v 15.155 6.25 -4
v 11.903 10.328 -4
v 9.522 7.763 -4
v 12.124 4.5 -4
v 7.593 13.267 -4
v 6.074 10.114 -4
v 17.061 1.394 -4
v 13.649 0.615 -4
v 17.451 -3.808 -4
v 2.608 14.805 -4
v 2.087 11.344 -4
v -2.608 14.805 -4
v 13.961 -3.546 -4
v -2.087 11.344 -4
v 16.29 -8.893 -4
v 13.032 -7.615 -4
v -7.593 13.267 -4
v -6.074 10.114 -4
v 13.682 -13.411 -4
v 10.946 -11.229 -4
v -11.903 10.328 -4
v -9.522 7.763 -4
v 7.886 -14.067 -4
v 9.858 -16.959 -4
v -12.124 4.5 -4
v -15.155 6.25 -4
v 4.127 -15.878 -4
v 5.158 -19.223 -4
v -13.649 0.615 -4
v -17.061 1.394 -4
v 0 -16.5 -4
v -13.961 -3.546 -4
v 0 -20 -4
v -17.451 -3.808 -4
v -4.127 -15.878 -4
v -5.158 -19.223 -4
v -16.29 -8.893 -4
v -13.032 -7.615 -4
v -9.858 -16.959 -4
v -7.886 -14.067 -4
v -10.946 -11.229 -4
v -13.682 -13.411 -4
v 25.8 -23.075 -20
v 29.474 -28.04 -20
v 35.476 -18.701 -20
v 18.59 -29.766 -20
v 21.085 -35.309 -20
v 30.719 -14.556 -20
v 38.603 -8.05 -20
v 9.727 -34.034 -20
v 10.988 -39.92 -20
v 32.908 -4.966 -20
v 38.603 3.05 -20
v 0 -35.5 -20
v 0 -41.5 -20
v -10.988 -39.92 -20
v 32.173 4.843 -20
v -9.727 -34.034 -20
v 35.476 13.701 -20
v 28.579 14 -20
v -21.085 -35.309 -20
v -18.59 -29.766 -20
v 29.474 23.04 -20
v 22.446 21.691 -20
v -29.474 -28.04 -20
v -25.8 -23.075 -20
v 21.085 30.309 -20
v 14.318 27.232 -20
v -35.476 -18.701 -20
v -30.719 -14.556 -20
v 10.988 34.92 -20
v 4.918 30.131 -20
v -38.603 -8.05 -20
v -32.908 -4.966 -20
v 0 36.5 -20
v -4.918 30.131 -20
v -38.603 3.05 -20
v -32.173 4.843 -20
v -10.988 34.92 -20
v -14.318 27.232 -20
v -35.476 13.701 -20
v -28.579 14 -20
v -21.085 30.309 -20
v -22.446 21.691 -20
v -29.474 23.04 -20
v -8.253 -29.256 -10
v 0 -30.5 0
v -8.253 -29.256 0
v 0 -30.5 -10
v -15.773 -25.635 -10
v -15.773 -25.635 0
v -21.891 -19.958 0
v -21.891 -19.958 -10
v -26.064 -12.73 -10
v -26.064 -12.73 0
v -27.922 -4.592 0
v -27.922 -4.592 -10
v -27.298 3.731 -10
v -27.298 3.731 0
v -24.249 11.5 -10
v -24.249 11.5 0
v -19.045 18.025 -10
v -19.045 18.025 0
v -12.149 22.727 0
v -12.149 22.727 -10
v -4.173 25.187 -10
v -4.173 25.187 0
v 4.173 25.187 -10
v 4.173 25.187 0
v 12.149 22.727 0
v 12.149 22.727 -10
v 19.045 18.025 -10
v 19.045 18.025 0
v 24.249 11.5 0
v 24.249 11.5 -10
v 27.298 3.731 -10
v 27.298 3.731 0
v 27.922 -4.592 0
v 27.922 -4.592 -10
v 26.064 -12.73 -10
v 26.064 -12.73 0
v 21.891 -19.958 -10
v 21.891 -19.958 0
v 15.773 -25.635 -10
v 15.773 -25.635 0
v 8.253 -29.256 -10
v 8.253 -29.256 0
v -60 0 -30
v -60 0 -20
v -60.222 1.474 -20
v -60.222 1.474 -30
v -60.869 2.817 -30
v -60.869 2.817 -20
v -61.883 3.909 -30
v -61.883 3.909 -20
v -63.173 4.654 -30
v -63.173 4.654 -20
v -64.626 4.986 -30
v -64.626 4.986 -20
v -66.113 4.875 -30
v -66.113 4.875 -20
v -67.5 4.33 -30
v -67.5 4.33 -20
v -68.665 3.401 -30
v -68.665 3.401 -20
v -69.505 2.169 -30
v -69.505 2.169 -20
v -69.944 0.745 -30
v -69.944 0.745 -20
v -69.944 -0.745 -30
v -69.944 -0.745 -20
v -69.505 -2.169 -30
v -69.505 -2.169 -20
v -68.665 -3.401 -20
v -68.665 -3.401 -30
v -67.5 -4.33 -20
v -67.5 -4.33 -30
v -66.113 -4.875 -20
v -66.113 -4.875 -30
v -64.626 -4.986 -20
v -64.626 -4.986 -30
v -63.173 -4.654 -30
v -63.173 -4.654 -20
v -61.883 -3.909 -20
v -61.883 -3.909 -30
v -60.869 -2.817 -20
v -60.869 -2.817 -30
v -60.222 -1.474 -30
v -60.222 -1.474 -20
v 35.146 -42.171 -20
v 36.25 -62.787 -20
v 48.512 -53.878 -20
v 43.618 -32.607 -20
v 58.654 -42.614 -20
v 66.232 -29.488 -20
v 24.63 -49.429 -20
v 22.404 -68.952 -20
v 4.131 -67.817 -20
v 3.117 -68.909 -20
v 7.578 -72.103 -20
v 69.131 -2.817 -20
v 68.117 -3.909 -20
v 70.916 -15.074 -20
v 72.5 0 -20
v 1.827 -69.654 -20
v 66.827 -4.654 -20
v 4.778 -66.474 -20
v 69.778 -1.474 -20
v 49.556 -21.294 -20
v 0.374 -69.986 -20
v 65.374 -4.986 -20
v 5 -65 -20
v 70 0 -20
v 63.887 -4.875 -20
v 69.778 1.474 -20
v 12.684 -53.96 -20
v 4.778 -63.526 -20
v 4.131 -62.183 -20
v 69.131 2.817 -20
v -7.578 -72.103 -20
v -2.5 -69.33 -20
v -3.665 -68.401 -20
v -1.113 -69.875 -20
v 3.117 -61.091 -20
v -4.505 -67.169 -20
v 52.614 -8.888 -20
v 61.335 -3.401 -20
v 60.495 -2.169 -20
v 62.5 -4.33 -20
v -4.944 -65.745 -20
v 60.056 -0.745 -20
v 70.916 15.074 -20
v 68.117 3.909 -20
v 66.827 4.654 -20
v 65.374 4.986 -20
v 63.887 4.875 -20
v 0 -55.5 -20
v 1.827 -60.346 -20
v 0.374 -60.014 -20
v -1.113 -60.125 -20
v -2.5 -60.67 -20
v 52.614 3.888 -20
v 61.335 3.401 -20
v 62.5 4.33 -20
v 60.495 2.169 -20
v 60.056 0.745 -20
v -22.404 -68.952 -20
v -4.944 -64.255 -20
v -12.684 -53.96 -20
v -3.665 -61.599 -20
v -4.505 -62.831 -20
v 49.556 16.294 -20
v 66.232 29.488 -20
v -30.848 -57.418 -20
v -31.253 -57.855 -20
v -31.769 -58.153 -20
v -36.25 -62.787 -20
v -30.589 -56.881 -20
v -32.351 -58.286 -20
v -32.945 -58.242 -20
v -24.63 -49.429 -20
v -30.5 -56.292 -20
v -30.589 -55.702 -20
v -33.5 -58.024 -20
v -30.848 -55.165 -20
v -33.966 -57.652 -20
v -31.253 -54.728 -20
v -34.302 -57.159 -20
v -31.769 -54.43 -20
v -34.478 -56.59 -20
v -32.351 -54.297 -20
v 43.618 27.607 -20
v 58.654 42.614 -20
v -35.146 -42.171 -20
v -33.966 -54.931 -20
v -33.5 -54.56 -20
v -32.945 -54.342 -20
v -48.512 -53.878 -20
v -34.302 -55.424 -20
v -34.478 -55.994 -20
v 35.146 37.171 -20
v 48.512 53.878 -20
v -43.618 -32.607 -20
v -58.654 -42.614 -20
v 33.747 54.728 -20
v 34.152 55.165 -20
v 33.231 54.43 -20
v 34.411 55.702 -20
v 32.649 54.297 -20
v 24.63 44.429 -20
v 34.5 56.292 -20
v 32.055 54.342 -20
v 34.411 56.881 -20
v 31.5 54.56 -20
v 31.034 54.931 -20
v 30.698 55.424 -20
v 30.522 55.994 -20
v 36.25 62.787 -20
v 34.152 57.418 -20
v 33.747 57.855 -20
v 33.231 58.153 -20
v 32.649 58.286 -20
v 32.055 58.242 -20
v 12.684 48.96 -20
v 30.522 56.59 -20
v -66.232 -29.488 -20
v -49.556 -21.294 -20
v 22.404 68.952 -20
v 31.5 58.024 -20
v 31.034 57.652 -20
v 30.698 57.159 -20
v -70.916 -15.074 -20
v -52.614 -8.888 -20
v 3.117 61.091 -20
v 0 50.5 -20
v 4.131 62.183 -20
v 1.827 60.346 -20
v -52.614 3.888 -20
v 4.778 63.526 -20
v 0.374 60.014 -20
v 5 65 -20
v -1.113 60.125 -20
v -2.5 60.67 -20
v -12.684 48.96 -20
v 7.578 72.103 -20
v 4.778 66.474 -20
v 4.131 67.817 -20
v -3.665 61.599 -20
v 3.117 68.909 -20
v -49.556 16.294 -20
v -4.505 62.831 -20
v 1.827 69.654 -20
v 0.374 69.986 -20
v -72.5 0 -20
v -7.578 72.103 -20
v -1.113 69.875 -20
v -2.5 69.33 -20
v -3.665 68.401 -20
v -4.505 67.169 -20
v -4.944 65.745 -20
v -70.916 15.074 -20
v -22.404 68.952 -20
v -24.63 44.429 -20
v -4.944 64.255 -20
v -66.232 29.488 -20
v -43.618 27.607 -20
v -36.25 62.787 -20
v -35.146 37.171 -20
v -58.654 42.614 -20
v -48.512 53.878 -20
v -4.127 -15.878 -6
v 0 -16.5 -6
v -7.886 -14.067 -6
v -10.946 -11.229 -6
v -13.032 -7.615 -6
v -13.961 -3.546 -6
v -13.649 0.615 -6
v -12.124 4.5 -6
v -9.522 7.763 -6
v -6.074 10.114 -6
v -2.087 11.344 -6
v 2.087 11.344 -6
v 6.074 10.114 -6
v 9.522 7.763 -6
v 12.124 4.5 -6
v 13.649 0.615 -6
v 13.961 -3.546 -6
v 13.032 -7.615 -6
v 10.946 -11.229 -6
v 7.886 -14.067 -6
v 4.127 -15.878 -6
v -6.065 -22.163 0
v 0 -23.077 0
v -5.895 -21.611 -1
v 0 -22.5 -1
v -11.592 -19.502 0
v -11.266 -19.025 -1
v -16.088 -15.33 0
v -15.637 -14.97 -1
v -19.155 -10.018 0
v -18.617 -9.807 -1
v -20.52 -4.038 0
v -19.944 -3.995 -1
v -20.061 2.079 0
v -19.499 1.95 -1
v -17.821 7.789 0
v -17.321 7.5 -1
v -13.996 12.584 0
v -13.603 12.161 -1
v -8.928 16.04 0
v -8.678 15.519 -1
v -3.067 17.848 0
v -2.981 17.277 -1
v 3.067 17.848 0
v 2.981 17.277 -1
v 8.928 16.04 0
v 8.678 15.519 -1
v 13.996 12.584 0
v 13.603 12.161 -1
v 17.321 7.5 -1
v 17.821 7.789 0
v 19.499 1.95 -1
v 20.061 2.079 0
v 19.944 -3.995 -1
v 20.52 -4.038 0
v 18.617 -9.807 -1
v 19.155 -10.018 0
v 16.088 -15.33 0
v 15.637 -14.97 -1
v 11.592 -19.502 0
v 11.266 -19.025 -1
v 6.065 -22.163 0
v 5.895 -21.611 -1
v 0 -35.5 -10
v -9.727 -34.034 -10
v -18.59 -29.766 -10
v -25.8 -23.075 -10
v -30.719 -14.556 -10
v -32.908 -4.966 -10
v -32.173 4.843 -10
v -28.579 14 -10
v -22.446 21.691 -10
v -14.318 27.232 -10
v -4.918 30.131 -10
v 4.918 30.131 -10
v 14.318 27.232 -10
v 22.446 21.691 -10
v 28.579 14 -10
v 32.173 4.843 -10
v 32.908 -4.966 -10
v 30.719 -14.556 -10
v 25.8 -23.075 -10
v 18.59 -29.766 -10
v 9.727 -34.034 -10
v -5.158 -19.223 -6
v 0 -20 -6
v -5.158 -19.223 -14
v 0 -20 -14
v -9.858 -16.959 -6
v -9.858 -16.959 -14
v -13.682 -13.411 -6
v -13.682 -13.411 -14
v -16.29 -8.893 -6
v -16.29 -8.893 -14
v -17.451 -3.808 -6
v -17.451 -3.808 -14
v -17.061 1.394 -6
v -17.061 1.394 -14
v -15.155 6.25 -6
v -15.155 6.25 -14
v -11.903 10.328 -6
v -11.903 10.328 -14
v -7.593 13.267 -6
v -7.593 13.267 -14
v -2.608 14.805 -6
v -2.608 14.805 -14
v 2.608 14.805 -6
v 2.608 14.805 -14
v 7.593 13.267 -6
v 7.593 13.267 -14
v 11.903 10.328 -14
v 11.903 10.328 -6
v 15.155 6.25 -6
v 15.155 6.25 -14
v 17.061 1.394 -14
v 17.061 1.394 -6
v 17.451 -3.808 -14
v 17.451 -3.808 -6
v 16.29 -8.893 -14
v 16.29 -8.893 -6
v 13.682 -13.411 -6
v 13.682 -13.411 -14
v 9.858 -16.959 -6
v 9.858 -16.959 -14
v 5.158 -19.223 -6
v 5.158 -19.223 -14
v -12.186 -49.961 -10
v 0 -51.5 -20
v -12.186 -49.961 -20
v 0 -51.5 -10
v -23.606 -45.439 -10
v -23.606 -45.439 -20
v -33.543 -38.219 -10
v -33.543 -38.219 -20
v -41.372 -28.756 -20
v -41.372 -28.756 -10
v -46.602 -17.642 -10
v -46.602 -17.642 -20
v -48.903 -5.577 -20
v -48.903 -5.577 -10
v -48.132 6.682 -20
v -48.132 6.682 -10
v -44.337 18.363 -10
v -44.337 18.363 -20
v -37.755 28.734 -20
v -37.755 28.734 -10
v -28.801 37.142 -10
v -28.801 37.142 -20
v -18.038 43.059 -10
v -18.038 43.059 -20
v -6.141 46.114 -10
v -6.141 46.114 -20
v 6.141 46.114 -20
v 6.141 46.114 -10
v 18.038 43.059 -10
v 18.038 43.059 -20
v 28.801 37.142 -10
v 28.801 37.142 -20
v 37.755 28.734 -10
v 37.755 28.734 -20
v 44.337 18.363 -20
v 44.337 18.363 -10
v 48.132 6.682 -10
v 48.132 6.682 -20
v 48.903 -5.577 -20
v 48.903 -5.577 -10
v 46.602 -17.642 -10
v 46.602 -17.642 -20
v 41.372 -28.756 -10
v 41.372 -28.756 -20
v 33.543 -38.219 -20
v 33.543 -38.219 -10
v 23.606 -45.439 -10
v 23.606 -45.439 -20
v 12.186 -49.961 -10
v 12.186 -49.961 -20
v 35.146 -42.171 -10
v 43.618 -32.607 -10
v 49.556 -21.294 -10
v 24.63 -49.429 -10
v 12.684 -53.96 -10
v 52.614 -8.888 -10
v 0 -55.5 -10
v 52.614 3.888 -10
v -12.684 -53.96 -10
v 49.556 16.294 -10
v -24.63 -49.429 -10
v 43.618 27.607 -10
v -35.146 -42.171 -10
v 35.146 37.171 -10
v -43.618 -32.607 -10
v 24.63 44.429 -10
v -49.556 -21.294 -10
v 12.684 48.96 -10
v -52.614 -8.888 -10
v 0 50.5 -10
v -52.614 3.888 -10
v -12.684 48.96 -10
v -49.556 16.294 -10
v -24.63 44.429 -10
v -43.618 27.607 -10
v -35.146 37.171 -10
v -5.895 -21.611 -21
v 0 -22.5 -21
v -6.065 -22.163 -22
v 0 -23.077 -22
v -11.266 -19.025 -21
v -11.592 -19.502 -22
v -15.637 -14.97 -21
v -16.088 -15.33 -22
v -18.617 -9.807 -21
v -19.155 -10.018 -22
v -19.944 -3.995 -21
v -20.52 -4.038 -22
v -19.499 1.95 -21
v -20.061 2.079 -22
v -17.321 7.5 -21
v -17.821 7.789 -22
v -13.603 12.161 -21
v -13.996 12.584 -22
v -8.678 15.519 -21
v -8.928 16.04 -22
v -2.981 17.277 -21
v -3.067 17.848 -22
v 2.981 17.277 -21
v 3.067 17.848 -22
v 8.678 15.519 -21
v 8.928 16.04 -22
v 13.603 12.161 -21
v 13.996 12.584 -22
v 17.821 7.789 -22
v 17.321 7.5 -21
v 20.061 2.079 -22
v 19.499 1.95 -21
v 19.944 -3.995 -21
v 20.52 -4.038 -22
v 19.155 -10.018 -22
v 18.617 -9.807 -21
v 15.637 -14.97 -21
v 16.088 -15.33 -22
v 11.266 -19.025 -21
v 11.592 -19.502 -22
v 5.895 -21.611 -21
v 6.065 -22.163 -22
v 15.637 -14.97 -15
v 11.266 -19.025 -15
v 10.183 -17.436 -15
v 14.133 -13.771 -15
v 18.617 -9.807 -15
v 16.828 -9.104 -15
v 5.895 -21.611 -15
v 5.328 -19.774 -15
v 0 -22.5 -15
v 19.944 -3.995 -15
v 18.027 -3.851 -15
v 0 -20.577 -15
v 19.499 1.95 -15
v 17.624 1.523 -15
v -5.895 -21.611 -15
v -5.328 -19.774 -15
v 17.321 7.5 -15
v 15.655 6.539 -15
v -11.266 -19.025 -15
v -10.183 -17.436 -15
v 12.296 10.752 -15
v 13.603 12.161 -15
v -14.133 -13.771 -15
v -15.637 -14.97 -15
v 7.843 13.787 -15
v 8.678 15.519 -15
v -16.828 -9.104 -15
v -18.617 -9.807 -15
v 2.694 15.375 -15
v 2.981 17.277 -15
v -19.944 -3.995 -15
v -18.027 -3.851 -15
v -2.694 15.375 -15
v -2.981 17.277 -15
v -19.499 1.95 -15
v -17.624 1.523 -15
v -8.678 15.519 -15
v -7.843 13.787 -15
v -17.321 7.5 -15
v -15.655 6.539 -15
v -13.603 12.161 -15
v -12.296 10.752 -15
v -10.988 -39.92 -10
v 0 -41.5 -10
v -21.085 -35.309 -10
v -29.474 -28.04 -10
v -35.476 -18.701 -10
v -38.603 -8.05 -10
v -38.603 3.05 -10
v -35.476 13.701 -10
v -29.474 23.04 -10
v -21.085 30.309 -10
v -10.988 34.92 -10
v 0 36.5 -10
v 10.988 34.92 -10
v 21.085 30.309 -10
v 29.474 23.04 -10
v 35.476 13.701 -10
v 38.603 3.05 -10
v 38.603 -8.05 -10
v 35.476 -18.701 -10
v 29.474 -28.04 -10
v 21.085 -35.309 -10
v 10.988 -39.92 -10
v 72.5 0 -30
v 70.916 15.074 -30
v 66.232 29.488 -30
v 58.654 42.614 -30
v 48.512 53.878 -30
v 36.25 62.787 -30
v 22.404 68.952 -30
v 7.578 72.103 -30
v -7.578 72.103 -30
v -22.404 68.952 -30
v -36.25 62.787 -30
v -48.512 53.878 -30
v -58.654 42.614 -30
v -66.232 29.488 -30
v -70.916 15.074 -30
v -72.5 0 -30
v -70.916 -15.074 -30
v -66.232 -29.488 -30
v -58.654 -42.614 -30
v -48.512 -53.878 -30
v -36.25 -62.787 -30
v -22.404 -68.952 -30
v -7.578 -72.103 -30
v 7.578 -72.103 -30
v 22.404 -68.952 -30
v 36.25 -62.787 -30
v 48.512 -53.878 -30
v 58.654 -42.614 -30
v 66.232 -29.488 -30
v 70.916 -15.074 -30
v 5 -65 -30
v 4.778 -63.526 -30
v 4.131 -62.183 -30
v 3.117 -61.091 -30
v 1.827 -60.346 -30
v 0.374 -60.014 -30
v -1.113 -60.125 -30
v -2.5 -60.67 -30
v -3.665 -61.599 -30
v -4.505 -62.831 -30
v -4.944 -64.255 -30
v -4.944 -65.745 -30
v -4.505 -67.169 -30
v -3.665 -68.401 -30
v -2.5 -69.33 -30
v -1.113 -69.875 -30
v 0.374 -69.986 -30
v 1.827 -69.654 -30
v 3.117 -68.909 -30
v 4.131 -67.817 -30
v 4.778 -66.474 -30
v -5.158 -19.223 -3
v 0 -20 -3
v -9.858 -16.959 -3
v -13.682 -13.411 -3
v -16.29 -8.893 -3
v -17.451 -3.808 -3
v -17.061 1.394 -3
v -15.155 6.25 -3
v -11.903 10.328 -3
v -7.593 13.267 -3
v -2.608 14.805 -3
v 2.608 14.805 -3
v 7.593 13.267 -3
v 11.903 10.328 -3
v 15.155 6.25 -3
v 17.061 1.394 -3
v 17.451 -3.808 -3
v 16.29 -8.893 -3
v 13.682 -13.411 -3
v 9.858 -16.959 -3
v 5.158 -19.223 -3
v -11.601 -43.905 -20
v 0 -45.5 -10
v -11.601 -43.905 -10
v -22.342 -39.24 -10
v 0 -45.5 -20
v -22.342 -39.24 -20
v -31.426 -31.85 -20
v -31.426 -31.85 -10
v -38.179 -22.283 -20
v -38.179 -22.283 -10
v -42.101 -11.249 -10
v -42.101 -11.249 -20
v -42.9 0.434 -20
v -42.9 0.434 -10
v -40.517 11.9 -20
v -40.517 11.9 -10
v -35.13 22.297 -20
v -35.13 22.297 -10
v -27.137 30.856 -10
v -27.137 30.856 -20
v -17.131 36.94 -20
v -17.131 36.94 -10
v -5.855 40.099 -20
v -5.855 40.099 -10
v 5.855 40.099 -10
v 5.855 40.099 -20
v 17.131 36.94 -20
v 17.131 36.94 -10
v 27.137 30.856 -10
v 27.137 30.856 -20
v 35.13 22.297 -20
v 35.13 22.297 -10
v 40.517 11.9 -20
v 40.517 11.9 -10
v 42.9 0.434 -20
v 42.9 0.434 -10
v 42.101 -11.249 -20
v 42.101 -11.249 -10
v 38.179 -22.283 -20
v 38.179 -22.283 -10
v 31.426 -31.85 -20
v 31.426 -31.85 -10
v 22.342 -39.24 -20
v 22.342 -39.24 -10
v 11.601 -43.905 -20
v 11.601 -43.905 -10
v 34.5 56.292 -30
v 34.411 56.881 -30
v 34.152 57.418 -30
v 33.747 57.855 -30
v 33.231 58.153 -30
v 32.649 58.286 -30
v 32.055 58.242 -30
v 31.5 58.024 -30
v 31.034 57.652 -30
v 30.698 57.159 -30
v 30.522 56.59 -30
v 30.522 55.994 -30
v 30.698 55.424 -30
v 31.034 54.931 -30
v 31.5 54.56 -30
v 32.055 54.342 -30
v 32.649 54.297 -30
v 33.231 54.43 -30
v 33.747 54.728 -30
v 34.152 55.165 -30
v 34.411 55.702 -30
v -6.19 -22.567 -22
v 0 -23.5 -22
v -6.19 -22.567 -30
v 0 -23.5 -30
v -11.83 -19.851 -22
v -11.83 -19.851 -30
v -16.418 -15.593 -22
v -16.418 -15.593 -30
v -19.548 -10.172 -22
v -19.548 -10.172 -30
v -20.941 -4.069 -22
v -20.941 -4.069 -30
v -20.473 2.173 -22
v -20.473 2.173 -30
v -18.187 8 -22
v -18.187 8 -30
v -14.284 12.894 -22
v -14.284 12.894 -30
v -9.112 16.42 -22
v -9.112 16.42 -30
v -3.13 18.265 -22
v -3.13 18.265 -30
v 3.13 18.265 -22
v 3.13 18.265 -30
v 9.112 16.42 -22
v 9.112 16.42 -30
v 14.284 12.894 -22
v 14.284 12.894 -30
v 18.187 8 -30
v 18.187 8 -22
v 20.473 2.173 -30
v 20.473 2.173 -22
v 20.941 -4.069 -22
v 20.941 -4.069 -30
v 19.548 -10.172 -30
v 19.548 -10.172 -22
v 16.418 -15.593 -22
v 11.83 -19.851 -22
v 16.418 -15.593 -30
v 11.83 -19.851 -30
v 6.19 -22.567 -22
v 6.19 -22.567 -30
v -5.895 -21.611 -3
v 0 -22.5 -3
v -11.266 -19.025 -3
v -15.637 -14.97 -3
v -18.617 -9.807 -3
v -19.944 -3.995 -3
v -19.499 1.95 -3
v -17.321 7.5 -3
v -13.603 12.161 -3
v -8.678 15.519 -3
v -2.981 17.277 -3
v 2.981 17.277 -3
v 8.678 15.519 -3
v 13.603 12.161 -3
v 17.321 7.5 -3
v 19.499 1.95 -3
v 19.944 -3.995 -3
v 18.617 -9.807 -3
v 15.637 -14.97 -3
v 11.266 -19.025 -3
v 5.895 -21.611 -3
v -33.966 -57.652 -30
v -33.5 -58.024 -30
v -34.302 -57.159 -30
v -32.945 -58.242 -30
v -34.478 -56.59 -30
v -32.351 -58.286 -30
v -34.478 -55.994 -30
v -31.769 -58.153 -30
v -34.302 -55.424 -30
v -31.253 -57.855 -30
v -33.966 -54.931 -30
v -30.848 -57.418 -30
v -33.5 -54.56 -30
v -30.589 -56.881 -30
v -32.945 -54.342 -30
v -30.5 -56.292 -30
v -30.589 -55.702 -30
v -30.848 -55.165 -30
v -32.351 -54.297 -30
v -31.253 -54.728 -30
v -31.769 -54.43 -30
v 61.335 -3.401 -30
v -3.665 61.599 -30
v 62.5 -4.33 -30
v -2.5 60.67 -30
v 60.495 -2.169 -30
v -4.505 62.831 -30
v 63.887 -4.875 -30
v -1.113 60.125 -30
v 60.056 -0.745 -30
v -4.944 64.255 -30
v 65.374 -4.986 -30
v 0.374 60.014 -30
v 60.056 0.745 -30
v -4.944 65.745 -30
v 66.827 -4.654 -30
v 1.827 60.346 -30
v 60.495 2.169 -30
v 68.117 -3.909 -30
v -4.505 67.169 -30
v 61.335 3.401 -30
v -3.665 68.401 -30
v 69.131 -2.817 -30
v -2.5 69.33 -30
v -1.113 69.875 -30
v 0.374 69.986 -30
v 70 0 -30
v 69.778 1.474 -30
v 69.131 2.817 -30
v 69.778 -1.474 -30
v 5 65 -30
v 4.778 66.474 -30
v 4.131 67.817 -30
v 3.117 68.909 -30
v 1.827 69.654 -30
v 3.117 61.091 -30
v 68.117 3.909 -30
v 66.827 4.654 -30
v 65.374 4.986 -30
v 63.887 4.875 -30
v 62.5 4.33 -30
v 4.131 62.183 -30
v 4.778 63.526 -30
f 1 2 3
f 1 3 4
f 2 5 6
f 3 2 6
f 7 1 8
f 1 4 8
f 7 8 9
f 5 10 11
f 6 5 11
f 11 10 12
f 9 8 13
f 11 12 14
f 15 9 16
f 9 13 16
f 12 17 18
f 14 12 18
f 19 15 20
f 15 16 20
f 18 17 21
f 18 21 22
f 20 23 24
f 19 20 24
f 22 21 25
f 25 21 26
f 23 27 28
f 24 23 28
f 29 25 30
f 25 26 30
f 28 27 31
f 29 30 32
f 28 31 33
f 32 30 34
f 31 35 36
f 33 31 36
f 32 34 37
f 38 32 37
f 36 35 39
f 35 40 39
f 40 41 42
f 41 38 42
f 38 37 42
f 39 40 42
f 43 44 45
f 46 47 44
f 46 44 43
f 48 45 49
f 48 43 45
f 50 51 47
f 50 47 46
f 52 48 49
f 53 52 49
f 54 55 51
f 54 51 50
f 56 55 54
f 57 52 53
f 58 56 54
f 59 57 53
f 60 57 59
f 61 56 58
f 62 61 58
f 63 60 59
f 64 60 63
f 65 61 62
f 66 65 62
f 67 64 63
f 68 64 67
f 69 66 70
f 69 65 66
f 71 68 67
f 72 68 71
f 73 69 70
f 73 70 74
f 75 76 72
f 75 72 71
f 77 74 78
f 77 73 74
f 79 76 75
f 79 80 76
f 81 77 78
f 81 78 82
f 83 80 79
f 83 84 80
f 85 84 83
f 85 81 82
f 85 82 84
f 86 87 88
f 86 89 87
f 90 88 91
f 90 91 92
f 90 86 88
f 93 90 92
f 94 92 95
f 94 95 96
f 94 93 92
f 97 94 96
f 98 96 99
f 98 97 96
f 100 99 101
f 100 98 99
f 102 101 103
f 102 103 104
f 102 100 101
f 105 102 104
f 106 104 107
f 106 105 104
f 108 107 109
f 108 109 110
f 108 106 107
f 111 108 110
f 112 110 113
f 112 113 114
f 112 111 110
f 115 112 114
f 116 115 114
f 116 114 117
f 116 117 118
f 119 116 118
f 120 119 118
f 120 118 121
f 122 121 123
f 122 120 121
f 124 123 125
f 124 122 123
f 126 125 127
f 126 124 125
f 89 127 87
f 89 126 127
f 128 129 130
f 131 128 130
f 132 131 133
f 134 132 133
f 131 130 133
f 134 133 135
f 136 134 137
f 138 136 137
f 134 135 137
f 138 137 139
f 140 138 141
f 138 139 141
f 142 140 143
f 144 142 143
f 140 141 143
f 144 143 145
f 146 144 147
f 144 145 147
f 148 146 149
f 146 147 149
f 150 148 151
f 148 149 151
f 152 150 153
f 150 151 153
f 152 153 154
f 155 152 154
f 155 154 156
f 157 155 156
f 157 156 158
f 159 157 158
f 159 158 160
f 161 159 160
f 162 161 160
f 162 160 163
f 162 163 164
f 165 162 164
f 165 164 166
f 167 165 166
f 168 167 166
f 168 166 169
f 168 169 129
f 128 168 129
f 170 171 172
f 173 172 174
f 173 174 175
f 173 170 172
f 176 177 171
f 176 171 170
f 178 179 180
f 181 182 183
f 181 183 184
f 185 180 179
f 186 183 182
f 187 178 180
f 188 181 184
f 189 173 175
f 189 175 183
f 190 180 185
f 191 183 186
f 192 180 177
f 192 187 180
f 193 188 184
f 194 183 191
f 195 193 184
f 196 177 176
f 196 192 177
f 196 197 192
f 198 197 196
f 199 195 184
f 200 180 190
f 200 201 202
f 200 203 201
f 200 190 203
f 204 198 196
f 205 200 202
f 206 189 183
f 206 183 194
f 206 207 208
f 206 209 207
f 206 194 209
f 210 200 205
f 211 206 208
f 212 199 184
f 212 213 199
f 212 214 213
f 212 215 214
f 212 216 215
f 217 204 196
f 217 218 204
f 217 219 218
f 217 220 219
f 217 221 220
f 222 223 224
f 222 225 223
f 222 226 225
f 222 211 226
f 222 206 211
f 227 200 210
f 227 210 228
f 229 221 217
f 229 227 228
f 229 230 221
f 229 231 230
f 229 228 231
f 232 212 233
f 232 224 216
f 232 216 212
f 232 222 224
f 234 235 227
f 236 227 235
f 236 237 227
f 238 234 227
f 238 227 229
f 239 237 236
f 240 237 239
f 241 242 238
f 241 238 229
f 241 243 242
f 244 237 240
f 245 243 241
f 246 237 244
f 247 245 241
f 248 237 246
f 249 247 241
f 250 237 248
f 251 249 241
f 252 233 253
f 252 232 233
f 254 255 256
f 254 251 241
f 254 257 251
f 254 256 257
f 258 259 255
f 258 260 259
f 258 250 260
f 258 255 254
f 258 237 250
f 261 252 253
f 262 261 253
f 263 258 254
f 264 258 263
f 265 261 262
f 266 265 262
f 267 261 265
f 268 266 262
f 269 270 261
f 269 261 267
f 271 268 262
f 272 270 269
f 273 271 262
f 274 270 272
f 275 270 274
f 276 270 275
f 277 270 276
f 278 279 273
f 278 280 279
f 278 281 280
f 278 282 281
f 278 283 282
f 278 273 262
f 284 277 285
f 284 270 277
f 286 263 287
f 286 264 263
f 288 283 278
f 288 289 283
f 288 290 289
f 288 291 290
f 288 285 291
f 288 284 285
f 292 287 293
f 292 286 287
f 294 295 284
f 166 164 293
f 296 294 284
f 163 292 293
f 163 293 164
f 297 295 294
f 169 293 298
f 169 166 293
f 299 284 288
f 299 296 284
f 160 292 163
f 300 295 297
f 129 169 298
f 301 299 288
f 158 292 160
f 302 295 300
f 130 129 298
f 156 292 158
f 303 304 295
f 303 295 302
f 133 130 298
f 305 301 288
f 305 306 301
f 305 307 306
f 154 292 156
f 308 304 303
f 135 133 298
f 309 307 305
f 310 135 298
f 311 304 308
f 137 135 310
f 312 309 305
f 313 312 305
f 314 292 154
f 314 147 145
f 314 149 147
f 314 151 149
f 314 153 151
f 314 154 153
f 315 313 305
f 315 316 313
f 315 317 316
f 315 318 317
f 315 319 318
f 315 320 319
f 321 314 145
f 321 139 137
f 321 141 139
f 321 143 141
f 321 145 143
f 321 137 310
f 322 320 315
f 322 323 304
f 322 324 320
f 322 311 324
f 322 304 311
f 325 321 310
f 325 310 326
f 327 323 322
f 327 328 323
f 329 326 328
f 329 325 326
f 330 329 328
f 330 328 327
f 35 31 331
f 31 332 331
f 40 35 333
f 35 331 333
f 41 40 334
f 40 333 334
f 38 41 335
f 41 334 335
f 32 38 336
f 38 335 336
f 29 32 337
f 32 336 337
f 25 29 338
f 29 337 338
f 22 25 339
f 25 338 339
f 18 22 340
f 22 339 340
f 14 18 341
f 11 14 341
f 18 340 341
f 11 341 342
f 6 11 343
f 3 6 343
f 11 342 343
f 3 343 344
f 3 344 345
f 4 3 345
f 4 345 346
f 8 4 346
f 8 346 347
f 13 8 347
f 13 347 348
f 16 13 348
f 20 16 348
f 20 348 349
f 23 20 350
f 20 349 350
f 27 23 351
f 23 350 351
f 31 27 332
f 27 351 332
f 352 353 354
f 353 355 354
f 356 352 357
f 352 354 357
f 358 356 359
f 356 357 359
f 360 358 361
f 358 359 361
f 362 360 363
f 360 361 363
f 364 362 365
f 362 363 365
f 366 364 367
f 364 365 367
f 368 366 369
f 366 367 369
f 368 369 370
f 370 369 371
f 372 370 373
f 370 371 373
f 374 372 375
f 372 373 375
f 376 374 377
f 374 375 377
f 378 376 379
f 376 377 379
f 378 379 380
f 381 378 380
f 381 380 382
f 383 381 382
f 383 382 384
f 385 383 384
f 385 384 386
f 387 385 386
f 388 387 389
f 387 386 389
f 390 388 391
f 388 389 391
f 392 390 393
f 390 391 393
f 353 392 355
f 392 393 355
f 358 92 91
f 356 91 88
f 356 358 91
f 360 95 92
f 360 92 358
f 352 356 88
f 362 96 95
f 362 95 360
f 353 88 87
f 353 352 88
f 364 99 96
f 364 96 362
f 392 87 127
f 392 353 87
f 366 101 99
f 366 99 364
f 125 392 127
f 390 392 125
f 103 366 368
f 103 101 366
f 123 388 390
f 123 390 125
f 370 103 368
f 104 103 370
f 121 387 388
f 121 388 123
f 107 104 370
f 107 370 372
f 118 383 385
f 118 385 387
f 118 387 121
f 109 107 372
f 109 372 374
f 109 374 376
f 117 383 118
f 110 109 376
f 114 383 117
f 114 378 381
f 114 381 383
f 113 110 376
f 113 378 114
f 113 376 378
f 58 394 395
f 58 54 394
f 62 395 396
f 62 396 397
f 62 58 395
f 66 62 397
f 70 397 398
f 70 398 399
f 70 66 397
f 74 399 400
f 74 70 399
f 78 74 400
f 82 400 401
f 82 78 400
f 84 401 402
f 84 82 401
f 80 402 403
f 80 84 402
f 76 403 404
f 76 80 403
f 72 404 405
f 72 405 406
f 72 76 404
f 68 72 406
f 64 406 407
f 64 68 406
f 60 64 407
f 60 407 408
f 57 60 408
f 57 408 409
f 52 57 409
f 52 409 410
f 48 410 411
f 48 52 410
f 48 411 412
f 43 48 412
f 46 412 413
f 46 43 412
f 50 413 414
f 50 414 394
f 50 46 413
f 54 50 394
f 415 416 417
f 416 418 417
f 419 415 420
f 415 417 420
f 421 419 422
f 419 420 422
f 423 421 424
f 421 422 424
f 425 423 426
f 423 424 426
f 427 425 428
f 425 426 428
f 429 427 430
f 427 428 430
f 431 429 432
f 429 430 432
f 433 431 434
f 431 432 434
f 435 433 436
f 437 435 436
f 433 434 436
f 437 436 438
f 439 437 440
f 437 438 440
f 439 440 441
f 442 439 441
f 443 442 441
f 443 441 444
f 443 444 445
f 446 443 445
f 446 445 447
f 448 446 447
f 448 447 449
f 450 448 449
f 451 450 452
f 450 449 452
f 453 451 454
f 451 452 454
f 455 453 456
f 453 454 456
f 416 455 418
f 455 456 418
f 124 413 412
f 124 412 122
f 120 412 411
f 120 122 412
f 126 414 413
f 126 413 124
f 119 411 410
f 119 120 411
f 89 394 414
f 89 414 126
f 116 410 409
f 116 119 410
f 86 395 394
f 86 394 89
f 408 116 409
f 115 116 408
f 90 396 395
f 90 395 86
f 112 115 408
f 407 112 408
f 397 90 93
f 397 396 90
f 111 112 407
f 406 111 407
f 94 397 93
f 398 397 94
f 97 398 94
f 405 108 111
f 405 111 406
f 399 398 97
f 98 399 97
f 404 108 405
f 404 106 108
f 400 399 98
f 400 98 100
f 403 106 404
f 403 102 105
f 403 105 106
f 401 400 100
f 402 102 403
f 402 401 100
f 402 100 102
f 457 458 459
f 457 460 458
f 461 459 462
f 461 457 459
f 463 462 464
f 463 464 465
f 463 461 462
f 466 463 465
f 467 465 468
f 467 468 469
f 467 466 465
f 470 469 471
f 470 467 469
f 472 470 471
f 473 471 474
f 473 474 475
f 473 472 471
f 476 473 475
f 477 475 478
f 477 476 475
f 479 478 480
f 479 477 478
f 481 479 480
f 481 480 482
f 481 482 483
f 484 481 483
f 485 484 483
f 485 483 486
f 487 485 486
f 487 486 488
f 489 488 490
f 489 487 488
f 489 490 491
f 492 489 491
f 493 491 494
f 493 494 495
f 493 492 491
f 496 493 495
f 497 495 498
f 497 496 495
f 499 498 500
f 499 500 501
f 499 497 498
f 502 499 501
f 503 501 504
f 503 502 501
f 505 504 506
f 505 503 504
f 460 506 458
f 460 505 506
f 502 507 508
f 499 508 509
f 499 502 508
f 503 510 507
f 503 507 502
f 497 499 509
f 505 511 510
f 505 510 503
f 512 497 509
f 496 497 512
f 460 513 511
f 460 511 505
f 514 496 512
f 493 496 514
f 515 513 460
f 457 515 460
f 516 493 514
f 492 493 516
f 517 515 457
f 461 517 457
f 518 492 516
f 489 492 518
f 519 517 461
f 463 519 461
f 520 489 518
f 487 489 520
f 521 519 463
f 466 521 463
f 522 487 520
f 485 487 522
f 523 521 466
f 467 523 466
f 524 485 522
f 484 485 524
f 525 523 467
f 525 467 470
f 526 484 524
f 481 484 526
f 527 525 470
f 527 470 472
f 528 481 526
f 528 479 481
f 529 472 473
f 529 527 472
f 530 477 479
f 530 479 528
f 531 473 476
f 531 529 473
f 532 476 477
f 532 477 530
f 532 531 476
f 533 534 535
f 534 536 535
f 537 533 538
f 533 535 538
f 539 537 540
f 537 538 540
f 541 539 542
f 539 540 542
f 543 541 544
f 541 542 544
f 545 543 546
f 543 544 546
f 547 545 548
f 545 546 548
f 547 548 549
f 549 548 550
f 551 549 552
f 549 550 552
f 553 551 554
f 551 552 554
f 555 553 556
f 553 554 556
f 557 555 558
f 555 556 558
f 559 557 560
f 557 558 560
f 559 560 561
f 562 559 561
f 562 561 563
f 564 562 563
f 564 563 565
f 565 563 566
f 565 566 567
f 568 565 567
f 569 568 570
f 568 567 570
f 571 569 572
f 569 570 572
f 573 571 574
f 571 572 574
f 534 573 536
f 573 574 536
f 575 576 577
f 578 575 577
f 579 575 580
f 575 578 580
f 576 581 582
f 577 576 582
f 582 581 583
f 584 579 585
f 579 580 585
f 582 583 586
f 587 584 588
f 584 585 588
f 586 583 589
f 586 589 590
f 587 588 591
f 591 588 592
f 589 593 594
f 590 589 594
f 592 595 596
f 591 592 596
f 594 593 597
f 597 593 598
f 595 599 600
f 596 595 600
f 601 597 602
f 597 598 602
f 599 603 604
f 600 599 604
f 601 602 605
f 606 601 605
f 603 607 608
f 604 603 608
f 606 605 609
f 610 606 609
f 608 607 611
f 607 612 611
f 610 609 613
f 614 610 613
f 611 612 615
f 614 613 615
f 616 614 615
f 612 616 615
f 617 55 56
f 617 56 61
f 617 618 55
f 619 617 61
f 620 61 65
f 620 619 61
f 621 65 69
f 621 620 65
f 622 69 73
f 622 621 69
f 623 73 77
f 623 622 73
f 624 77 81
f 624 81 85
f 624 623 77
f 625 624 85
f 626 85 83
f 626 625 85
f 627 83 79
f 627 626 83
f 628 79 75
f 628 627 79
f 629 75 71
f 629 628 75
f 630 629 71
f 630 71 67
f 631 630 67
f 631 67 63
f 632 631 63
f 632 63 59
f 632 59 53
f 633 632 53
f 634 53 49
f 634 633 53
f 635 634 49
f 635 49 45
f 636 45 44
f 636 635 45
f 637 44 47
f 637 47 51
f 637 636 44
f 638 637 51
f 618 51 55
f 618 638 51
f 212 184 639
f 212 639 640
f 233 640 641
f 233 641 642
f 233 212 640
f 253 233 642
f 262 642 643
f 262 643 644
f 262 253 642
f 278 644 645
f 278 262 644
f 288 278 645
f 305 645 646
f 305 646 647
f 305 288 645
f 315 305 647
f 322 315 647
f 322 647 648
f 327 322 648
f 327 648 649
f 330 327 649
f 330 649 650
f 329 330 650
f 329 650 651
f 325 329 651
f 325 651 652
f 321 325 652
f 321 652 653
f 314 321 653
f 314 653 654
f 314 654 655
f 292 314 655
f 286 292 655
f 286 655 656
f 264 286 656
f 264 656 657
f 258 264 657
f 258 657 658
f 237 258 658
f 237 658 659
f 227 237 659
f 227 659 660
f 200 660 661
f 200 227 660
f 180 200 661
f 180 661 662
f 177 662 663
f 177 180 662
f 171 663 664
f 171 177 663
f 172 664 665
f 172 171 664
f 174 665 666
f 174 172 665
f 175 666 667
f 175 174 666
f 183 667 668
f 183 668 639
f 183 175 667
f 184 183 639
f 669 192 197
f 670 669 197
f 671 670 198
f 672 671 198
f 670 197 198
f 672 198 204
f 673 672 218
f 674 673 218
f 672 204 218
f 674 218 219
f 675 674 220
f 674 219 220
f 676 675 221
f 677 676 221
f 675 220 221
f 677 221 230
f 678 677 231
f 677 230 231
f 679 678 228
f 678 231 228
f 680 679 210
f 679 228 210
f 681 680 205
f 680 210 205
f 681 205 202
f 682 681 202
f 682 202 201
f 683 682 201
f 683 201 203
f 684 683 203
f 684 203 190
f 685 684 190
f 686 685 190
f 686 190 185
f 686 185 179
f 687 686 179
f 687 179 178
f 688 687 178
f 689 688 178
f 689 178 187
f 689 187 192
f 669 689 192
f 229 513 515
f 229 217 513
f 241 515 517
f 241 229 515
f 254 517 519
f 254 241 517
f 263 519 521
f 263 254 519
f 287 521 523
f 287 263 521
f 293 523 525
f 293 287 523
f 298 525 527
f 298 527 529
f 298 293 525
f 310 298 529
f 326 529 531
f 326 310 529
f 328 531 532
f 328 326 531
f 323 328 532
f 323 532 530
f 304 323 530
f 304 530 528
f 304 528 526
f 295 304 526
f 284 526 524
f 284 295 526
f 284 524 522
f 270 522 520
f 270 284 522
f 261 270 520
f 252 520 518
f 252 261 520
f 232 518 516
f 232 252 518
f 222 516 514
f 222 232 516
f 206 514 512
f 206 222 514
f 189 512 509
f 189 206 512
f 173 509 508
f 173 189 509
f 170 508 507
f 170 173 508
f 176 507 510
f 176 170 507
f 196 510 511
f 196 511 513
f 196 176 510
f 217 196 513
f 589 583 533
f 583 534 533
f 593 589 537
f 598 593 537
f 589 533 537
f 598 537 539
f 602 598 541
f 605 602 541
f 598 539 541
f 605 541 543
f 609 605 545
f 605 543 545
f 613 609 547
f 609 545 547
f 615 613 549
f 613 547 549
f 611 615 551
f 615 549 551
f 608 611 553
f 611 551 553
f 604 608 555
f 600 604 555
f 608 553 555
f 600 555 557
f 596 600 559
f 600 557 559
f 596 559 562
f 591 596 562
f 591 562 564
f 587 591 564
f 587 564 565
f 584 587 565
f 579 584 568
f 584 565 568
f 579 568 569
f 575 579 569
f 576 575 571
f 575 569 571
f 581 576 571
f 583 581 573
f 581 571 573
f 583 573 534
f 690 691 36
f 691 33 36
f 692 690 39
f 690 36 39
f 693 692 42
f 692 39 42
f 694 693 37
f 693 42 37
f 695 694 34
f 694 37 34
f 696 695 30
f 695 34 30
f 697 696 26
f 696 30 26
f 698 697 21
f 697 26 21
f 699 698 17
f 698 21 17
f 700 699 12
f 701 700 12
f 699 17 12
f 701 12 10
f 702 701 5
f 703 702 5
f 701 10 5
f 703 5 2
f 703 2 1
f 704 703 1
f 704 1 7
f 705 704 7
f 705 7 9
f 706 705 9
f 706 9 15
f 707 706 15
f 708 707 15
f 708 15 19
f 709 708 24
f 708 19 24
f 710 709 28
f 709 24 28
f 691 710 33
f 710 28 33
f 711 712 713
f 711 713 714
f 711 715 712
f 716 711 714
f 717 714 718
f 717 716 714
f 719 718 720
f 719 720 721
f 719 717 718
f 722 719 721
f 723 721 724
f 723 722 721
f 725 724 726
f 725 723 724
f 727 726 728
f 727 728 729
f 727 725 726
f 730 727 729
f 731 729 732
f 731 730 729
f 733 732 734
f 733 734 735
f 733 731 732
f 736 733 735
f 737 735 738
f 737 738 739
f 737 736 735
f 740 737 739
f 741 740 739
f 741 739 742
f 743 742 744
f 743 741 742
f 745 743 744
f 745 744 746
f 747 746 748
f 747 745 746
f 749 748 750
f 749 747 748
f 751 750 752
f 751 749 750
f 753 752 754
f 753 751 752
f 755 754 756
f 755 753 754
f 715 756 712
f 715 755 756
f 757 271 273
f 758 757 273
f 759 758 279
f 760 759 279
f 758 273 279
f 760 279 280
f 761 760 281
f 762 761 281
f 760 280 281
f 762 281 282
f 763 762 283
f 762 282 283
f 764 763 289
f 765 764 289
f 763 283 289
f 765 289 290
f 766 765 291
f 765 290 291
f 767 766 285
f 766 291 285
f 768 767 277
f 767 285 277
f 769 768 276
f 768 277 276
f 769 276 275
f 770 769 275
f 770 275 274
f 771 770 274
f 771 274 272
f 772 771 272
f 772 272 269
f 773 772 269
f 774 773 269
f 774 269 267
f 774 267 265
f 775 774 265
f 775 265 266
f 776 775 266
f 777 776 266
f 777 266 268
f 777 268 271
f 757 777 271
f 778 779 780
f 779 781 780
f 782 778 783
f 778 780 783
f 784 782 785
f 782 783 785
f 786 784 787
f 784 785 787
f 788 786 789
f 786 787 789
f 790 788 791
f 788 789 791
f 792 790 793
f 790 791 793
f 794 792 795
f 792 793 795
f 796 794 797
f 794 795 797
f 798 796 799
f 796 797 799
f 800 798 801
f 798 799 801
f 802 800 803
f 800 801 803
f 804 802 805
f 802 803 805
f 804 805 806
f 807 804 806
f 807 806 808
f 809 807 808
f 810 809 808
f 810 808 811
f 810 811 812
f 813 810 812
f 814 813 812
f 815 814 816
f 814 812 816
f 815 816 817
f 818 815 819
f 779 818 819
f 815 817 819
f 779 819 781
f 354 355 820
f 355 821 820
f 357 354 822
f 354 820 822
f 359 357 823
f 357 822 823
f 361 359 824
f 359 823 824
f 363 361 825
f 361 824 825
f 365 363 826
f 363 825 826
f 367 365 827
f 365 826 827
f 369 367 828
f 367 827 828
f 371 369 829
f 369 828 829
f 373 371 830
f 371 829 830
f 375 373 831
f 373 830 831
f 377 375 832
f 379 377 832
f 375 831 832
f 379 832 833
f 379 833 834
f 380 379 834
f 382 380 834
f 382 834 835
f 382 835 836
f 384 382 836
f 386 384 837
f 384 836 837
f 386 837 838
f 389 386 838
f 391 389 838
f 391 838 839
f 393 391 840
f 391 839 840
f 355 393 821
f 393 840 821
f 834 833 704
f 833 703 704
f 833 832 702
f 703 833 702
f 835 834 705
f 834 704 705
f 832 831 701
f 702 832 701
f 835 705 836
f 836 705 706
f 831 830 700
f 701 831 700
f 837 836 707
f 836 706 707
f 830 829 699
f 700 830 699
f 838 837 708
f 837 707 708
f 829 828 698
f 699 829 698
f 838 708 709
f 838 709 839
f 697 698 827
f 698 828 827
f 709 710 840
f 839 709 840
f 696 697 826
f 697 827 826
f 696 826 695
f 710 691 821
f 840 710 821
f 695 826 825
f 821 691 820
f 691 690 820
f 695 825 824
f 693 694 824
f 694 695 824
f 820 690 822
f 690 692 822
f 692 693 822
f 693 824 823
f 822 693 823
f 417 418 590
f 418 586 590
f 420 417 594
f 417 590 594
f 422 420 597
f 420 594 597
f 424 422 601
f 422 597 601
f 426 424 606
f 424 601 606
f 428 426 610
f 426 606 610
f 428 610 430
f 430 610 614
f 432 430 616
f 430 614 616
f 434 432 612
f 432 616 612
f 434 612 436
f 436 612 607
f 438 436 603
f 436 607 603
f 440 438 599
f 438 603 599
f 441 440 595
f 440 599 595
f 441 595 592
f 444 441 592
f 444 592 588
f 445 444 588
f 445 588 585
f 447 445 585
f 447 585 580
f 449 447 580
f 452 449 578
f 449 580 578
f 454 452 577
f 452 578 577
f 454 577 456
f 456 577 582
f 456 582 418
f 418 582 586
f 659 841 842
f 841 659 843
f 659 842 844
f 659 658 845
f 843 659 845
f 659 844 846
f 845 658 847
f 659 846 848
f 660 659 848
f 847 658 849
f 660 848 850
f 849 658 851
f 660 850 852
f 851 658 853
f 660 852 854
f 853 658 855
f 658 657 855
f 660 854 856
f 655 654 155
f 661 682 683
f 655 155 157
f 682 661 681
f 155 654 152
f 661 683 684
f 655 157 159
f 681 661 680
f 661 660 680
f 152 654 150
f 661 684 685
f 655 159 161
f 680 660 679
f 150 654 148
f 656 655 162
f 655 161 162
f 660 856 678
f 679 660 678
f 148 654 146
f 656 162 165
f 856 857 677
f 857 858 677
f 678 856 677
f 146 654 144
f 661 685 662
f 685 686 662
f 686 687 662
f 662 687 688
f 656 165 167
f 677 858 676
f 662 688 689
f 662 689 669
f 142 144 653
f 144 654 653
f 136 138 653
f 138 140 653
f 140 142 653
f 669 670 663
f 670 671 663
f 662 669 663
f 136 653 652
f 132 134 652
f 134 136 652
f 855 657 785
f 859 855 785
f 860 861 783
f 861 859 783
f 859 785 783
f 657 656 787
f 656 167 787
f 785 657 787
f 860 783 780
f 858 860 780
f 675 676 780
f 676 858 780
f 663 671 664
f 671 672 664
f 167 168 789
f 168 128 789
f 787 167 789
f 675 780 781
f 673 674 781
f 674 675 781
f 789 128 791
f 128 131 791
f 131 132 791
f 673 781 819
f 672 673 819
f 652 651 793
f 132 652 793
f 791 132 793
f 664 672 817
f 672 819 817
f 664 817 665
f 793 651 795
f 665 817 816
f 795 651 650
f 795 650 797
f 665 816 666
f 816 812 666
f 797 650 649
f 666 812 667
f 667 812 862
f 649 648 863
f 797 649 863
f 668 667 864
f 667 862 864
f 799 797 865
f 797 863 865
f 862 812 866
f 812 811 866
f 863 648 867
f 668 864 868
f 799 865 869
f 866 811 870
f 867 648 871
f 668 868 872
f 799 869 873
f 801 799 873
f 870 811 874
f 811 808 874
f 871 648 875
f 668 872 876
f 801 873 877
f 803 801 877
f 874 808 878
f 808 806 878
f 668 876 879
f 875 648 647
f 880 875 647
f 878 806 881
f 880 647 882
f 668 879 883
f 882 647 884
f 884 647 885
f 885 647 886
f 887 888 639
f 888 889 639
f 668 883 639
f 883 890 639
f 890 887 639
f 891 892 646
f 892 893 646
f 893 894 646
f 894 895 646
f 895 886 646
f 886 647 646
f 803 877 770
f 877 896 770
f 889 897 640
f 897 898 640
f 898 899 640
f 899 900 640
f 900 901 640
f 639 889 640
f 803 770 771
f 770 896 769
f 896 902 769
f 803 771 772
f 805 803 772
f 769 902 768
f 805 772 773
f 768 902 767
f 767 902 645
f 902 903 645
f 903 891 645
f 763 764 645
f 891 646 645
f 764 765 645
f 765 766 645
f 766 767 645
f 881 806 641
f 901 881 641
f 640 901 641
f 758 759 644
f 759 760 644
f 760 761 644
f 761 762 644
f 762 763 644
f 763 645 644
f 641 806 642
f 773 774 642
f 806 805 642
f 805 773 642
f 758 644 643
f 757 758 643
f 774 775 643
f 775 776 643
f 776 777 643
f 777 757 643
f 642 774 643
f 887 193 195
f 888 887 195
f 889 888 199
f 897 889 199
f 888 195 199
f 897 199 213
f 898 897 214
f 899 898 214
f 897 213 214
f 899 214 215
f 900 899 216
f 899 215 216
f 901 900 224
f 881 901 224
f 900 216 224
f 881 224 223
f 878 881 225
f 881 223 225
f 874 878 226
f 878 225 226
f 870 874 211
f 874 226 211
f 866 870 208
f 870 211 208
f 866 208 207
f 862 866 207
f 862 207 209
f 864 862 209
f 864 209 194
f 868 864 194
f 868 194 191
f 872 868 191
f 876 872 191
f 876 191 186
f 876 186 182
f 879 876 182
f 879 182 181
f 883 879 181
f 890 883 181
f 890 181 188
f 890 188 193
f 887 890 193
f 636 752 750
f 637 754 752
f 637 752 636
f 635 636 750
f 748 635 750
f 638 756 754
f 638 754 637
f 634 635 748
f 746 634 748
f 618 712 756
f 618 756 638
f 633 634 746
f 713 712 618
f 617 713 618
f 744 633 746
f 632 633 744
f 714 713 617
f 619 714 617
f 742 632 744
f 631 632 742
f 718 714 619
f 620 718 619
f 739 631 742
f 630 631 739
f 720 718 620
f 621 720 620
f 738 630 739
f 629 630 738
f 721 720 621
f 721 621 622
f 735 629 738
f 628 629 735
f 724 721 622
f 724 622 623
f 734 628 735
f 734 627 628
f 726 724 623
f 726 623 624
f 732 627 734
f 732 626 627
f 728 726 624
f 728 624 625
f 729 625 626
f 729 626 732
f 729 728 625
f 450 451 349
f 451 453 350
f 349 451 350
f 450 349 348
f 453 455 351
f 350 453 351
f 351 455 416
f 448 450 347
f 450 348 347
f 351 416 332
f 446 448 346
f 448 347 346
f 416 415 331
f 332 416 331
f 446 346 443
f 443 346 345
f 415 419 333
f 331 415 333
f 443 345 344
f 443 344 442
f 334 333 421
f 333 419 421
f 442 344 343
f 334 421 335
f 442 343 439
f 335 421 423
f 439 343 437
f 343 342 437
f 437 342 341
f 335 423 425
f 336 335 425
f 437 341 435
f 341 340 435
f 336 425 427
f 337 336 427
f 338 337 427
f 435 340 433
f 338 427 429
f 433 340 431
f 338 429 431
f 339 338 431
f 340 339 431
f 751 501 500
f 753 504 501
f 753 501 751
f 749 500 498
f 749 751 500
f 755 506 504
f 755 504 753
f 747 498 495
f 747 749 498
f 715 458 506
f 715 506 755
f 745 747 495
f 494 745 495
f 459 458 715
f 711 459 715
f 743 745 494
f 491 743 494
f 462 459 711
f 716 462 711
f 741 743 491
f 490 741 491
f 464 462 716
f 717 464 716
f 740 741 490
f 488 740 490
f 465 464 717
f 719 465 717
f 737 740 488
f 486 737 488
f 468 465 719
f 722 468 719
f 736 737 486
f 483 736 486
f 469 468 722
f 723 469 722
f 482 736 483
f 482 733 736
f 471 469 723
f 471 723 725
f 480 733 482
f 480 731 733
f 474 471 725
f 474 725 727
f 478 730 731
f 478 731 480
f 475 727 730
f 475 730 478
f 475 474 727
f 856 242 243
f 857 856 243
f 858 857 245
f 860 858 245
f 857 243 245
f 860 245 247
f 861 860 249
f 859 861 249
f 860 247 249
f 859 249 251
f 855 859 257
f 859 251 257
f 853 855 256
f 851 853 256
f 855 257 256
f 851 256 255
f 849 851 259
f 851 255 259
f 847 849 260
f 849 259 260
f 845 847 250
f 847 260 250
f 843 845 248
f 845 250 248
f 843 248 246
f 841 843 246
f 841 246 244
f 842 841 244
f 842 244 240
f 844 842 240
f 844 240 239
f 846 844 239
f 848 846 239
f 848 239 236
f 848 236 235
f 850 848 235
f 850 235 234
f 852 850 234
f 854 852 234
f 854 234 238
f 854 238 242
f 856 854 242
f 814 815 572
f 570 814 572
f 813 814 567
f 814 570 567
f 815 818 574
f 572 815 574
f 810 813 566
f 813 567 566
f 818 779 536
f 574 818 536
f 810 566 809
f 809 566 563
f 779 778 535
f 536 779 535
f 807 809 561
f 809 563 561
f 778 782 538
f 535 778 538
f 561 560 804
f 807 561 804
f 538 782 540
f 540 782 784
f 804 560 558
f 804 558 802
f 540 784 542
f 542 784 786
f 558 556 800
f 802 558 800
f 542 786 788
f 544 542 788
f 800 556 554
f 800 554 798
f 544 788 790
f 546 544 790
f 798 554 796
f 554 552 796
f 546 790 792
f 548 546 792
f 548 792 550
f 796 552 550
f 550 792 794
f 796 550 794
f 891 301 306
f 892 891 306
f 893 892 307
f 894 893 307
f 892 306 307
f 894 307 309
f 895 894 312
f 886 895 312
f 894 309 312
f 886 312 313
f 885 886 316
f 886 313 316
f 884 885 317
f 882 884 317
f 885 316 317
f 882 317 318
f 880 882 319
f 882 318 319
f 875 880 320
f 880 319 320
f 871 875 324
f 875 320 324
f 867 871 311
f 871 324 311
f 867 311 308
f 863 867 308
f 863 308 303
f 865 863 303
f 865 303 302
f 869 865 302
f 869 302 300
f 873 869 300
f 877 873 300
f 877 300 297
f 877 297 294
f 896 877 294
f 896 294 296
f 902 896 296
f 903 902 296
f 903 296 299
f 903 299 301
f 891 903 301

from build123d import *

# Parameters (mm, degrees)
ESQUISSE1_R      = 72.5
ESQUISSE1_R_2    = 5
ESQUISSE1_R_3    = 2
EXTRUSION1_DEPTH = 30


with BuildPart() as part:
    # Esquisse1 → Extrusion1 (new body)
    with BuildSketch(Plane.XY):
        Circle(ESQUISSE1_R)
        with Locations((0, -65)):
            Circle(ESQUISSE1_R_2, mode=Mode.SUBTRACT)
        with Locations((65, 0)):
            Circle(ESQUISSE1_R_2, mode=Mode.SUBTRACT)
        with Locations((0, 65)):
            Circle(ESQUISSE1_R_2, mode=Mode.SUBTRACT)
        with Locations((32.5, 56.291651246)):
            Circle(ESQUISSE1_R_3, mode=Mode.SUBTRACT)
        with Locations((-32.5, -56.291651246)):
            Circle(ESQUISSE1_R_3, mode=Mode.SUBTRACT)
        with Locations((-65, 0)):
            Circle(ESQUISSE1_R_2, mode=Mode.SUBTRACT)
    extrude(amount=-EXTRUSION1_DEPTH)

    # Esquisse2 → Enlèvement de matière-Révolution1 (revolve, cut)
    with BuildSketch(Plane(origin=(0, 0, 0), x_dir=(0, 0, -1), z_dir=(1, 0, 0)), mode=Mode.PRIVATE) as enl_vement_de_mati_re_r_volution1_sk:
        Polygon((14, 15), (15, 15.577350269), (15, 17.5), (21, 17.5), (22, 18.077350269), (22, 18.5), (30, 18.5), (30, -2.5), (0, -2.5), (0, 18.077350269), (1, 17.5), (3, 17.5), (3, 15), (4, 15), (4, 11.5), (6, 11.5), (6, 15), align=None)
    revolve(enl_vement_de_mati_re_r_volution1_sk.sketch.rotate(Axis((0, -2.5, 0), (0, 0, -1)), 180), axis=Axis((0, -2.5, 0), (0, 0, -1)), mode=Mode.SUBTRACT)  # turned: the seam where the file's is

    # Esquisse3 → Enlèvement de matière-Révolution2 (revolve, cut)
    with BuildSketch(Plane(origin=(0, 0, 0), x_dir=(0, 0, -1), z_dir=(1, 0, 0))):
        Polygon((10, -41.5), (10, -45.5), (20, -45.5), (20, -51.5), (10, -51.5), (10, -55.5), (20, -55.5), (20, -82.5), (0, -82.5), (0, -30.5), (10, -30.5), (10, -35.5), (20, -35.5), (20, -41.5), align=None)
    revolve(axis=Axis((0, -2.5, 12.602017423), (0, 0, -1)), mode=Mode.SUBTRACT)


solid = part.part
